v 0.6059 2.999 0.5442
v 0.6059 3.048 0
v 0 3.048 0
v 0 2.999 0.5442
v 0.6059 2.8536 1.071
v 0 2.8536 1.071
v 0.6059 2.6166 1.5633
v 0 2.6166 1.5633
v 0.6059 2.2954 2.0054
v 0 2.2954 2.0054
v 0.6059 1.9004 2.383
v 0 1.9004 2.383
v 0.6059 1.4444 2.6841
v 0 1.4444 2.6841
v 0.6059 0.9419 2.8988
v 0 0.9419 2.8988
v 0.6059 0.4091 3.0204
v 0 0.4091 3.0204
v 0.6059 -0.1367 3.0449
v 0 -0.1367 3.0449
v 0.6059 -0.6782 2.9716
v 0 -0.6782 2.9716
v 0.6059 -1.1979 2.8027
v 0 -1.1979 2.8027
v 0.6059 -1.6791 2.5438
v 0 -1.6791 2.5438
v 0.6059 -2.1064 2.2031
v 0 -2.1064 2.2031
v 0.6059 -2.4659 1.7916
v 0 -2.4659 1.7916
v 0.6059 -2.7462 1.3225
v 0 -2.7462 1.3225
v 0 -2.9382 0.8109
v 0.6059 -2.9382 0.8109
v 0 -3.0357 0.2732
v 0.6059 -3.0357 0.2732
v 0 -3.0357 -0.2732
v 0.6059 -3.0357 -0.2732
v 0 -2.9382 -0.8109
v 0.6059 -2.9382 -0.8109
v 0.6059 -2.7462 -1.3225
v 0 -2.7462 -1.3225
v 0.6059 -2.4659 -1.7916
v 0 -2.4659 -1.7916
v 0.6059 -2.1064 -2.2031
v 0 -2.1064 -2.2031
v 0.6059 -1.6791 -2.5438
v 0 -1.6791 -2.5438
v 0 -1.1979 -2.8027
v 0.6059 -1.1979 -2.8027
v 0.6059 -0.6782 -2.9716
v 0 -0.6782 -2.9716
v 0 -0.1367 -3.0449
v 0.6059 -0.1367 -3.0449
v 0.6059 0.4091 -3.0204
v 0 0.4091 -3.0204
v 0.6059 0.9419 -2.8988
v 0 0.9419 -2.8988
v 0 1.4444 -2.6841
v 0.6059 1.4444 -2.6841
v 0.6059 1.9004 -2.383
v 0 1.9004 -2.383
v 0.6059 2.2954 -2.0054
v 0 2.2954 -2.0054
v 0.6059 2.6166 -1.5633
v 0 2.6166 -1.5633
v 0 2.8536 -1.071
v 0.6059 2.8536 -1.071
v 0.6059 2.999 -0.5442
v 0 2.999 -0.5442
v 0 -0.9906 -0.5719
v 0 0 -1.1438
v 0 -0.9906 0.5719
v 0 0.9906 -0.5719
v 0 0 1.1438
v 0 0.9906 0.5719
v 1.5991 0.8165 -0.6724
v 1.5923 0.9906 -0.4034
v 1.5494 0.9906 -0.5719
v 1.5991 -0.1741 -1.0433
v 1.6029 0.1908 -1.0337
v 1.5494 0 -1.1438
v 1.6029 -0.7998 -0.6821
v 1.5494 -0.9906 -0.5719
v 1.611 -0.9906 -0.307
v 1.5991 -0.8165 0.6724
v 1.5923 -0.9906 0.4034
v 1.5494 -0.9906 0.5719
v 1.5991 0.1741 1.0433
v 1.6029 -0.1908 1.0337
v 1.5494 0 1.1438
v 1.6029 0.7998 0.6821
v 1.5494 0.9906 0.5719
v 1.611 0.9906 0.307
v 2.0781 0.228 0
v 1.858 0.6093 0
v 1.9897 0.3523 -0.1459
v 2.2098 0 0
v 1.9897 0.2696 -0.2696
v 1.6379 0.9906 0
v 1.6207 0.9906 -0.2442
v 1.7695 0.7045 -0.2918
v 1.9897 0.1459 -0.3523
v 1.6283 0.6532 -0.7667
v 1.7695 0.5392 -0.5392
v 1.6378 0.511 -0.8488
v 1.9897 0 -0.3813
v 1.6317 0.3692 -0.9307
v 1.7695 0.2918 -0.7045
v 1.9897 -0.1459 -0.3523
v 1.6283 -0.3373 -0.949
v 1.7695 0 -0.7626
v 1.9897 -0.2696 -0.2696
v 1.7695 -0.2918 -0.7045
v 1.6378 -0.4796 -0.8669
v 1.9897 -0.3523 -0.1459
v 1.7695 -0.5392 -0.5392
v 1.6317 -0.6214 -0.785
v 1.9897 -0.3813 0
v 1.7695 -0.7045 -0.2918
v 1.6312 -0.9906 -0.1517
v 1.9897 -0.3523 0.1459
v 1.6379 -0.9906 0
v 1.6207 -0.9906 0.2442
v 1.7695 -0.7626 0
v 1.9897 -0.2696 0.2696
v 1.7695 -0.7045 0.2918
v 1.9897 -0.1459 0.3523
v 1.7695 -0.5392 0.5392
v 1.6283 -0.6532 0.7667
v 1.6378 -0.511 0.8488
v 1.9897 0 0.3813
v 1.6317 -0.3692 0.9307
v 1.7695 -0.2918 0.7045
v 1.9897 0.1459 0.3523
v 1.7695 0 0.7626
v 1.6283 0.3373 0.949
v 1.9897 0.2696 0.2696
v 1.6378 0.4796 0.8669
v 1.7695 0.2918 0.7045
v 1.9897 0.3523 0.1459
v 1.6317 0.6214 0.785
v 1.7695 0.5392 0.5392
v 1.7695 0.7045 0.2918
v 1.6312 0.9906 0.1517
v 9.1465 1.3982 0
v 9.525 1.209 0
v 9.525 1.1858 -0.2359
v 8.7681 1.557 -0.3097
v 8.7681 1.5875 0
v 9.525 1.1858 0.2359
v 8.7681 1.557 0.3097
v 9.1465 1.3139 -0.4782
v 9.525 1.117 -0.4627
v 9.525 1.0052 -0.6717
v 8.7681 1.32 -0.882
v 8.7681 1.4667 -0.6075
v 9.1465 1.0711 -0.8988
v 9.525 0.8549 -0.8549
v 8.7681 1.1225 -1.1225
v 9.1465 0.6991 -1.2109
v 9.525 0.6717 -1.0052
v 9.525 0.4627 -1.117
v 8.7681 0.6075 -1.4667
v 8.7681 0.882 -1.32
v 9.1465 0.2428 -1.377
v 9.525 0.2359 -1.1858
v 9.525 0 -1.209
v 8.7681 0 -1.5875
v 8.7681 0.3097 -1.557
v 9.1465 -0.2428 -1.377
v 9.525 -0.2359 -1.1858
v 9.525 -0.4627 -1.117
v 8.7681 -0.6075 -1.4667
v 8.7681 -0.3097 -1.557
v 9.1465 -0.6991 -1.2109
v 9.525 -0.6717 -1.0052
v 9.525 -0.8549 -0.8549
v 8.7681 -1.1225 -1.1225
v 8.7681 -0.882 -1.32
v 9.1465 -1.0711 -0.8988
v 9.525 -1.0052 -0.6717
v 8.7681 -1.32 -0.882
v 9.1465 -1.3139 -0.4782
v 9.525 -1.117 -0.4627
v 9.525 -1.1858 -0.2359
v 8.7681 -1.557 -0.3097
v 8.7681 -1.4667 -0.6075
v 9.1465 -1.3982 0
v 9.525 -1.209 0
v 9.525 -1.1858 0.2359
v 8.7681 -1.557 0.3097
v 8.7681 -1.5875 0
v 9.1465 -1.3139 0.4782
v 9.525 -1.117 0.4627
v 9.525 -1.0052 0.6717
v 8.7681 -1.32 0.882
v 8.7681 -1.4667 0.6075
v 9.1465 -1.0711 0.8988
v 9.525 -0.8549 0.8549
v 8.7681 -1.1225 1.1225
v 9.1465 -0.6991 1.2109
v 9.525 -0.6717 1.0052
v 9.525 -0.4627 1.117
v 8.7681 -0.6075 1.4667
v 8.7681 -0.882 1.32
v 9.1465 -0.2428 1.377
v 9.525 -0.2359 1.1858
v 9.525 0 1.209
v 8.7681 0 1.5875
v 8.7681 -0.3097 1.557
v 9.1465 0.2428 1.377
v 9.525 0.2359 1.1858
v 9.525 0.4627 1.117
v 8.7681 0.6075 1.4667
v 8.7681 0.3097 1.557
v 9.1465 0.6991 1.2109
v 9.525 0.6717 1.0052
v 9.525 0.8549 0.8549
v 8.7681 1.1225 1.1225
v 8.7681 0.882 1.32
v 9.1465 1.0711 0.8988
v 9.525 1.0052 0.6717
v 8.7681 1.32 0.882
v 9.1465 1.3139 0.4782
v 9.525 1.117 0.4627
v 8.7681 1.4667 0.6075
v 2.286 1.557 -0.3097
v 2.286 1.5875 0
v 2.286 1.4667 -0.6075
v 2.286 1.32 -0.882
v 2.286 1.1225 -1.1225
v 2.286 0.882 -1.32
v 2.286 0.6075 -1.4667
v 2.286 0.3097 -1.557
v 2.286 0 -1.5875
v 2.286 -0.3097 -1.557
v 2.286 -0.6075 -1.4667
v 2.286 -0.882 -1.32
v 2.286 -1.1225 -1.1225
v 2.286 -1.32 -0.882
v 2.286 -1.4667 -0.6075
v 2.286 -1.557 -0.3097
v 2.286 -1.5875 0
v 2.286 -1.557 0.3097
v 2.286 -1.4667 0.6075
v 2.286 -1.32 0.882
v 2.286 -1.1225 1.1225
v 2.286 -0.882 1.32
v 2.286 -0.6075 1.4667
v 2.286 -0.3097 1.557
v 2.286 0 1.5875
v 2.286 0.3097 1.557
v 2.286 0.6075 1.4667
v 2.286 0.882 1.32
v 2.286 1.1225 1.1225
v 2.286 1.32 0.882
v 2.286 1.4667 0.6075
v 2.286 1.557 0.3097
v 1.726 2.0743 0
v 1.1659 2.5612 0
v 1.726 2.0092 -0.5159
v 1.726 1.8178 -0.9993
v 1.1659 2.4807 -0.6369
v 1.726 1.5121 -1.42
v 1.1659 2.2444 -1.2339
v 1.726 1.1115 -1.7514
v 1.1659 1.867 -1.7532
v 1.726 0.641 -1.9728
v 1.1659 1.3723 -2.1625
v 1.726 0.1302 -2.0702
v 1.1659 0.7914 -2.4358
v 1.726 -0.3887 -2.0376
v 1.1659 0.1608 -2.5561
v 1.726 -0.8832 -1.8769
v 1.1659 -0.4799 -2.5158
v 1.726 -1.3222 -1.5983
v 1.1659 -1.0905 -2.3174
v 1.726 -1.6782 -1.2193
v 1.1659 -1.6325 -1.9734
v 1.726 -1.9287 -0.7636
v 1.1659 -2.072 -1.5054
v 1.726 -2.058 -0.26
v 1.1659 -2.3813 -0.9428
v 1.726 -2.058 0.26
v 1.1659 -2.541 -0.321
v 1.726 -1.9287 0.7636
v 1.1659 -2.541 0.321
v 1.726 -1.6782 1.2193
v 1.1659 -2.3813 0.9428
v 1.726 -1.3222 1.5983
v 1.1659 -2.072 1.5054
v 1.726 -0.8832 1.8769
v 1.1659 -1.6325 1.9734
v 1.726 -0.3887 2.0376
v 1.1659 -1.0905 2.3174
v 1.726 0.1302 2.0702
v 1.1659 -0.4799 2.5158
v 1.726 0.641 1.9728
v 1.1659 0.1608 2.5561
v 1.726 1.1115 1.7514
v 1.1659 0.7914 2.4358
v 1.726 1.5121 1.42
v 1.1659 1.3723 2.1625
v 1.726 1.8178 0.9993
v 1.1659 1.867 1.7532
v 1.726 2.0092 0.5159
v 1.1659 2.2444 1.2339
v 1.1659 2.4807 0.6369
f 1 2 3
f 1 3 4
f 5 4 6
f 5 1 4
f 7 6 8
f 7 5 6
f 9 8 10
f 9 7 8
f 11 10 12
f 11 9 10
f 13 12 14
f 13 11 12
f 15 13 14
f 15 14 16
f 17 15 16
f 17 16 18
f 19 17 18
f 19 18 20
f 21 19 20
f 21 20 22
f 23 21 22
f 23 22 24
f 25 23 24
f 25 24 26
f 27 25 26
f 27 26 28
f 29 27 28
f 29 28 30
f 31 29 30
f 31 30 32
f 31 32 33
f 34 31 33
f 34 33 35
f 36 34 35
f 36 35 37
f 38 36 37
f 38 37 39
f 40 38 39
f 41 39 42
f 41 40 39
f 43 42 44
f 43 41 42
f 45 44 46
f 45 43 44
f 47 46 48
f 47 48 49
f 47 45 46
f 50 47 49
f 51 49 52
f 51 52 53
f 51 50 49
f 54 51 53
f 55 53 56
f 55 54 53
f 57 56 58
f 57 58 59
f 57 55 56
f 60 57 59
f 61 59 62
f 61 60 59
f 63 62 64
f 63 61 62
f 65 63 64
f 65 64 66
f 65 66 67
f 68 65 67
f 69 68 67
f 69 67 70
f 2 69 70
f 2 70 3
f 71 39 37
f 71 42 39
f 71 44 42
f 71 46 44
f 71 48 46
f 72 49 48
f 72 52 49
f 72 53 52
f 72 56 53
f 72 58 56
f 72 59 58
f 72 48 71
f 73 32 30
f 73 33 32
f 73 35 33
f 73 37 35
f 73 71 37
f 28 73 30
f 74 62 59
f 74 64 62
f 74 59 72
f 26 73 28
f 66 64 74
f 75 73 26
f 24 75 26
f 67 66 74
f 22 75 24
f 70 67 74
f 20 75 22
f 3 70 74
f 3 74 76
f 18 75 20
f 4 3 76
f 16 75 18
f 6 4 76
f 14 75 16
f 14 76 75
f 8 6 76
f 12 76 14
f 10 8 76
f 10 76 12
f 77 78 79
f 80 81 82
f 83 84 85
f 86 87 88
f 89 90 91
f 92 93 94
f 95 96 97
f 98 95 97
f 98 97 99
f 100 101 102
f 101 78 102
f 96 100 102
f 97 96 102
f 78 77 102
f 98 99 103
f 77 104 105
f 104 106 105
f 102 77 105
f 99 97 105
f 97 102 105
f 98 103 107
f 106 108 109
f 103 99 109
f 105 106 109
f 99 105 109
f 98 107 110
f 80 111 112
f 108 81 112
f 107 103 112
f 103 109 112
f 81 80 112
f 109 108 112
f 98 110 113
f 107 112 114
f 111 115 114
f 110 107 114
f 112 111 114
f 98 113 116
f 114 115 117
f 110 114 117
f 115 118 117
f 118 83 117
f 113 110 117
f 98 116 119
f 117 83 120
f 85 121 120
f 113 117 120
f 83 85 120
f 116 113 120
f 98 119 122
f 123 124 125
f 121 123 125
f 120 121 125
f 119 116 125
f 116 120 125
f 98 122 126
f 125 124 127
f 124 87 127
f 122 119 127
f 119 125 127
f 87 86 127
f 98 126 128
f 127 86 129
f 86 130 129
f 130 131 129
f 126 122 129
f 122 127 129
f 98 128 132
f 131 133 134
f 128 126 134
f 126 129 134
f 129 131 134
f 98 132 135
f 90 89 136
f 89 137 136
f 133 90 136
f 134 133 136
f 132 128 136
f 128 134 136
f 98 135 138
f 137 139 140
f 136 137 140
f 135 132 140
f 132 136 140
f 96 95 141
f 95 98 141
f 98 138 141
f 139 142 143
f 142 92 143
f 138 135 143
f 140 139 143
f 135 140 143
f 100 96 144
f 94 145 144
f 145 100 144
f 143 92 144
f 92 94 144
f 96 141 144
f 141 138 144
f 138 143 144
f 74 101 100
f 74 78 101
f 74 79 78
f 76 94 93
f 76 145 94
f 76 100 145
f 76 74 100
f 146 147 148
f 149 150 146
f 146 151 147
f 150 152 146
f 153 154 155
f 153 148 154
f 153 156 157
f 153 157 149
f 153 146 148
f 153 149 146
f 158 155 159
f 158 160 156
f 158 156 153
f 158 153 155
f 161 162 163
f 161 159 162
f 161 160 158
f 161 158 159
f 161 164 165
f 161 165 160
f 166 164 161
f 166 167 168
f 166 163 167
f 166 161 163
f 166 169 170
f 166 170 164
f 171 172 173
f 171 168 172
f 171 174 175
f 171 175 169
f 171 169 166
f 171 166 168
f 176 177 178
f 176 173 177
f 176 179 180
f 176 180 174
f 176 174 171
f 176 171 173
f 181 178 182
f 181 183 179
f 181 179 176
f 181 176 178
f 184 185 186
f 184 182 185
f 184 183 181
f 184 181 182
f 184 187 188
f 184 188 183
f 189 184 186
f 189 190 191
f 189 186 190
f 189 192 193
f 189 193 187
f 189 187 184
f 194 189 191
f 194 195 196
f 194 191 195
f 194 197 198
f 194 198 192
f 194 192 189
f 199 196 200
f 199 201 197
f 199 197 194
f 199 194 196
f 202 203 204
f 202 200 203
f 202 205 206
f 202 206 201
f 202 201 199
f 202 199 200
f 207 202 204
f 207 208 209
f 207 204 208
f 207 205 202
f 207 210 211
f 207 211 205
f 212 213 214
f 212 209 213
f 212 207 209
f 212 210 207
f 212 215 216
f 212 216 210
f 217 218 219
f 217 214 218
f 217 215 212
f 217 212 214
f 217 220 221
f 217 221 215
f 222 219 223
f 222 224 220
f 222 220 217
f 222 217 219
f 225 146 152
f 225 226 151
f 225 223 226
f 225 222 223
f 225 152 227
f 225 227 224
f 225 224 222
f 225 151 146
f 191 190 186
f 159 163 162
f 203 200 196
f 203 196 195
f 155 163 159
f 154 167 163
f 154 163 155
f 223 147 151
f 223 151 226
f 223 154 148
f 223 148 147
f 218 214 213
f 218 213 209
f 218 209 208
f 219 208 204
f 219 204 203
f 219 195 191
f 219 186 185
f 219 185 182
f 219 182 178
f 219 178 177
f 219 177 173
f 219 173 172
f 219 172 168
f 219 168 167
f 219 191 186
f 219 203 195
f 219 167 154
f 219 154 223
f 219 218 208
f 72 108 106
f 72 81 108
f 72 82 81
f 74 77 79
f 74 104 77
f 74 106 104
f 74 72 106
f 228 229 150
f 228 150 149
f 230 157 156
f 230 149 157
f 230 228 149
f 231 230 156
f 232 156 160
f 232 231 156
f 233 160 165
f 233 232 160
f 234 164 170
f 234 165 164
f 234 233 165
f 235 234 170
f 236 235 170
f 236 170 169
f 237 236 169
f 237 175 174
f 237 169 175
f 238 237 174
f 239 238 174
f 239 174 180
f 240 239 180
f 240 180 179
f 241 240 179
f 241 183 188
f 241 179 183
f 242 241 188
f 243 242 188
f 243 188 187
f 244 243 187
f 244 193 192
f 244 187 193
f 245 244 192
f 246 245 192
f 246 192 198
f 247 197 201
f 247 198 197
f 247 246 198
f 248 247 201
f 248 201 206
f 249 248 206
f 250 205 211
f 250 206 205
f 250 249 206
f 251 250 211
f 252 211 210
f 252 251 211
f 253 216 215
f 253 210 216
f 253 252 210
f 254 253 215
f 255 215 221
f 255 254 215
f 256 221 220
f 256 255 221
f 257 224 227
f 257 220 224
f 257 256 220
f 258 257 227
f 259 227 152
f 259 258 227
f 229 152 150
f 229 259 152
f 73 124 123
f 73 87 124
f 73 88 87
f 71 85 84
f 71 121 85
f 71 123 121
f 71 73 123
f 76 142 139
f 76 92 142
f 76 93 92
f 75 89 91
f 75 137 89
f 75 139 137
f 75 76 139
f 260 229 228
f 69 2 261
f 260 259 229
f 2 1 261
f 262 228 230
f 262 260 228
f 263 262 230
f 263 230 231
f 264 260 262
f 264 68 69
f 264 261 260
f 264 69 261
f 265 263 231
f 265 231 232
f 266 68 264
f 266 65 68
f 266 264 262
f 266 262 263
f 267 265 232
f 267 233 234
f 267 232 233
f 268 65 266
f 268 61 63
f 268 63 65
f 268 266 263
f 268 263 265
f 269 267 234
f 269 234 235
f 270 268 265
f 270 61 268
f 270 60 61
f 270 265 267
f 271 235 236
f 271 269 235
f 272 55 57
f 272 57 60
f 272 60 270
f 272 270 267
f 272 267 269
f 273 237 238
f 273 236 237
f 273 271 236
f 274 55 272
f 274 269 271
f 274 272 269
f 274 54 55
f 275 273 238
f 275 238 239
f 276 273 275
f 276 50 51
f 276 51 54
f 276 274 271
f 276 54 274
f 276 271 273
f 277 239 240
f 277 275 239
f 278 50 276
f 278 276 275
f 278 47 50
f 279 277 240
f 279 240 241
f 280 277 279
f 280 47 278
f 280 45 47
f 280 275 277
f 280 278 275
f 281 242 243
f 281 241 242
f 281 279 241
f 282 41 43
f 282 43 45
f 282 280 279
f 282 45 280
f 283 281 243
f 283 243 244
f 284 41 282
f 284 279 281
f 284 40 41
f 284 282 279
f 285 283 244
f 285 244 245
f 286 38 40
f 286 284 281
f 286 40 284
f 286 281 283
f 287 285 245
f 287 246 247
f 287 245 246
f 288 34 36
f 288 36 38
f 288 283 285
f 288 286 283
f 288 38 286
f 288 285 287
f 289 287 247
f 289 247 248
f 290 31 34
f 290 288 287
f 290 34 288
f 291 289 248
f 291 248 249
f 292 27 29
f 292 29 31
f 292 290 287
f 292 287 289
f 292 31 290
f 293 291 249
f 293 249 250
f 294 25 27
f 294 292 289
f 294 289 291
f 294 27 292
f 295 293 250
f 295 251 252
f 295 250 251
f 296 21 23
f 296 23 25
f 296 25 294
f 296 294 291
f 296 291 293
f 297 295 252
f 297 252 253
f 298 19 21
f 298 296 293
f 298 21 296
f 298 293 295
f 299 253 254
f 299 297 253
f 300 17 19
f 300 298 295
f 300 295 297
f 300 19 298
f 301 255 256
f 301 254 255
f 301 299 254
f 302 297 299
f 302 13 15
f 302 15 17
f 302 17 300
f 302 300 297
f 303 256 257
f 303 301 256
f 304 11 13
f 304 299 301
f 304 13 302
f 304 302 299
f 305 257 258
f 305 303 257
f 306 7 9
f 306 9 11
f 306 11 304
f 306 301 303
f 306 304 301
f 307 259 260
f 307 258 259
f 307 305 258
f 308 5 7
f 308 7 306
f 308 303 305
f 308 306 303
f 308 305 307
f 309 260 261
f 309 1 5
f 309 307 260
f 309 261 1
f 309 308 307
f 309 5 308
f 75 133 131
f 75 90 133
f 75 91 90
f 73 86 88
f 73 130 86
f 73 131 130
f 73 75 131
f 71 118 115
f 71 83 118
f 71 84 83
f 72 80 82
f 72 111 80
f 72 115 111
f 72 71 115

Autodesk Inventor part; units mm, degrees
ref_plane "YZ Plane" through (0, 0, 0) normal (1, 0, 0) x (0, 1, 0)
ref_plane "XZ Plane" through (0, 0, 0) normal (0, 1, 0) x (-1, 0, 0)
sketch "Sketch1" plane through (0, 0, 0) normal (0, 0, 1) x (1, 0, 0)
  line L0 (9.525, 0) -> (9.525, 1.5875)
  line L1 (9.525, 1.5875) -> (3.8735, 1.5875)
  line L2 (3.8735, 1.5875) -> (2.286, 1.5875)
  line L3 (0, 3.048) -> (0, 1.1438)
  line L4 (0, 1.1438) -> (1.5494, 1.1438)
  line L5 (1.5494, 1.1438) -> (2.2098, 0)
  line L6 (2.2098, 0) -> (9.525, 0)
  line L7 (0, 3.048) -> (0.6059, 3.048)
  line L8 (0.6059, 3.048) -> (2.286, 1.5875)
  line L9 (2.286, 1.5875) -> (2.286, 1.5875)
  line L10 (3.8735, 1.5875) -> (2.286, 1.5875) construction
  line L11 (2.286, 1.5875) -> (2.286, 1.5875)
  line L12 (-1.905, 0) -> (11.43, 0) projected
  line L13 (0, -0.6096) -> (0, 3.6576) projected
  dimension "d0" = 9.525
  dimension "d1" = 5.6515
  dimension "d2" = 1.5494
  dimension "d3" = 3.175
  dimension "d6" = 2.286
  dimension "d7" = 41
  dimension "d8" = 2.2877
  dimension "d9" = 60
  dimension "d10" = 6.096
  dimension "d11" = 3.175
  dimension "d12" = 1.5875
revolve "Body" add sketch "Sketch1" angle 360 about axis through (2.2098, 0, 0) along (1, 0, 0) contours L6 L5 L4 L3 L7 L8 L2 L1 L0
sketch "Sketch2" plane through (0, 0, 0) normal (-1, 0, 0) x (0, 0, 1)
  circle A0 centre (0, 0) radius 1.1438 projected
  line L0 (0, -4.2672) -> (0, 4.2672) projected
  line L1 (-4.2672, 0) -> (4.2672, 0) projected
  line L2 (1.1438, 0) -> (0.5719, -0.9906)
  line L3 (0.5719, -0.9906) -> (-0.5719, -0.9906)
  line L4 (-0.5719, -0.9906) -> (-1.1438, 0)
  line L5 (-1.1438, 0) -> (-0.5719, 0.9906)
  line L6 (-0.5719, 0.9906) -> (0.5719, 0.9906)
  line L7 (0.5719, 0.9906) -> (1.1438, 0)
  point P0 (0, 1.1438)
extrude "Slot" add sketch "Sketch2" against normal up to next contours L7 A0 | A0 L2 | L6 L0 A0 | A0 L0 L3 | L0 L6 A0 | A0 L3 L0 | L4 A0 | A0 L5
thread "Thread" size "5-40 UNC" class "2A" standard "ANSI Unified Screw Threads" length 5.6515
chamfer "Chamfer1" distance 0.3785 distance2 0.7569 1 edges at (9.525, -1.5875, 0) measured on face at (9.525, -0.1593, -0.6099)
ref_plane "Work Plane1" through (104.775, 0, 0) normal (0, 0, -1) x (1, 0, 0)
equation "\"d15\" = GEL"
equation "\"d17\" = -0.5 * SPD + 0.5 * GD"
equation "\"d18\" = GUL"
equation "\"d0\" = NLG"
equation "\"d1\" = GEL"
equation "\"d2\" = INTI"
equation "\"d3\" = GD"
equation "\"d6\" = KOH"
equation "\"d7\" = 0.5 * SEWI"
equation "\"d8\" = 1.1547 * SW"
equation "\"d10\" = KOD"
equation "\"d11\" = BDM"
equation "\"d12\" = GAL"
equation "\"NLG\" = 9.525"
equation "\"INTI\" = 1.5494"
equation "\"GEL\" = 5.6515"
equation "\"GAL\" = 1.5875"
equation "\"KOH\" = 2.286"
equation "\"KOD\" = 6.096"
equation "\"GUL\" = 0.75692"
equation "\"SPD\" = 2.41808"
equation "\"BDM\" = NND"
equation "\"GD\" = NND"
equation "\"SEWI\" = 82deg"
equation "\"SW\" = 1.9812"
equation "\"TOA\" = 30deg"
equation "\"GD1\" = SPD"
equation "\"THREADDIA\" = 3.175"
equation "\"HHPTC\" = 0.635"
equation "\"NND\" = 3.175"
equation "\"E0\" = 1.155 * SW"
properties part number "ANSI B18.3 - 5-40 UNC x 0.375, HSFCHCSI" material "Steel, Mild"
